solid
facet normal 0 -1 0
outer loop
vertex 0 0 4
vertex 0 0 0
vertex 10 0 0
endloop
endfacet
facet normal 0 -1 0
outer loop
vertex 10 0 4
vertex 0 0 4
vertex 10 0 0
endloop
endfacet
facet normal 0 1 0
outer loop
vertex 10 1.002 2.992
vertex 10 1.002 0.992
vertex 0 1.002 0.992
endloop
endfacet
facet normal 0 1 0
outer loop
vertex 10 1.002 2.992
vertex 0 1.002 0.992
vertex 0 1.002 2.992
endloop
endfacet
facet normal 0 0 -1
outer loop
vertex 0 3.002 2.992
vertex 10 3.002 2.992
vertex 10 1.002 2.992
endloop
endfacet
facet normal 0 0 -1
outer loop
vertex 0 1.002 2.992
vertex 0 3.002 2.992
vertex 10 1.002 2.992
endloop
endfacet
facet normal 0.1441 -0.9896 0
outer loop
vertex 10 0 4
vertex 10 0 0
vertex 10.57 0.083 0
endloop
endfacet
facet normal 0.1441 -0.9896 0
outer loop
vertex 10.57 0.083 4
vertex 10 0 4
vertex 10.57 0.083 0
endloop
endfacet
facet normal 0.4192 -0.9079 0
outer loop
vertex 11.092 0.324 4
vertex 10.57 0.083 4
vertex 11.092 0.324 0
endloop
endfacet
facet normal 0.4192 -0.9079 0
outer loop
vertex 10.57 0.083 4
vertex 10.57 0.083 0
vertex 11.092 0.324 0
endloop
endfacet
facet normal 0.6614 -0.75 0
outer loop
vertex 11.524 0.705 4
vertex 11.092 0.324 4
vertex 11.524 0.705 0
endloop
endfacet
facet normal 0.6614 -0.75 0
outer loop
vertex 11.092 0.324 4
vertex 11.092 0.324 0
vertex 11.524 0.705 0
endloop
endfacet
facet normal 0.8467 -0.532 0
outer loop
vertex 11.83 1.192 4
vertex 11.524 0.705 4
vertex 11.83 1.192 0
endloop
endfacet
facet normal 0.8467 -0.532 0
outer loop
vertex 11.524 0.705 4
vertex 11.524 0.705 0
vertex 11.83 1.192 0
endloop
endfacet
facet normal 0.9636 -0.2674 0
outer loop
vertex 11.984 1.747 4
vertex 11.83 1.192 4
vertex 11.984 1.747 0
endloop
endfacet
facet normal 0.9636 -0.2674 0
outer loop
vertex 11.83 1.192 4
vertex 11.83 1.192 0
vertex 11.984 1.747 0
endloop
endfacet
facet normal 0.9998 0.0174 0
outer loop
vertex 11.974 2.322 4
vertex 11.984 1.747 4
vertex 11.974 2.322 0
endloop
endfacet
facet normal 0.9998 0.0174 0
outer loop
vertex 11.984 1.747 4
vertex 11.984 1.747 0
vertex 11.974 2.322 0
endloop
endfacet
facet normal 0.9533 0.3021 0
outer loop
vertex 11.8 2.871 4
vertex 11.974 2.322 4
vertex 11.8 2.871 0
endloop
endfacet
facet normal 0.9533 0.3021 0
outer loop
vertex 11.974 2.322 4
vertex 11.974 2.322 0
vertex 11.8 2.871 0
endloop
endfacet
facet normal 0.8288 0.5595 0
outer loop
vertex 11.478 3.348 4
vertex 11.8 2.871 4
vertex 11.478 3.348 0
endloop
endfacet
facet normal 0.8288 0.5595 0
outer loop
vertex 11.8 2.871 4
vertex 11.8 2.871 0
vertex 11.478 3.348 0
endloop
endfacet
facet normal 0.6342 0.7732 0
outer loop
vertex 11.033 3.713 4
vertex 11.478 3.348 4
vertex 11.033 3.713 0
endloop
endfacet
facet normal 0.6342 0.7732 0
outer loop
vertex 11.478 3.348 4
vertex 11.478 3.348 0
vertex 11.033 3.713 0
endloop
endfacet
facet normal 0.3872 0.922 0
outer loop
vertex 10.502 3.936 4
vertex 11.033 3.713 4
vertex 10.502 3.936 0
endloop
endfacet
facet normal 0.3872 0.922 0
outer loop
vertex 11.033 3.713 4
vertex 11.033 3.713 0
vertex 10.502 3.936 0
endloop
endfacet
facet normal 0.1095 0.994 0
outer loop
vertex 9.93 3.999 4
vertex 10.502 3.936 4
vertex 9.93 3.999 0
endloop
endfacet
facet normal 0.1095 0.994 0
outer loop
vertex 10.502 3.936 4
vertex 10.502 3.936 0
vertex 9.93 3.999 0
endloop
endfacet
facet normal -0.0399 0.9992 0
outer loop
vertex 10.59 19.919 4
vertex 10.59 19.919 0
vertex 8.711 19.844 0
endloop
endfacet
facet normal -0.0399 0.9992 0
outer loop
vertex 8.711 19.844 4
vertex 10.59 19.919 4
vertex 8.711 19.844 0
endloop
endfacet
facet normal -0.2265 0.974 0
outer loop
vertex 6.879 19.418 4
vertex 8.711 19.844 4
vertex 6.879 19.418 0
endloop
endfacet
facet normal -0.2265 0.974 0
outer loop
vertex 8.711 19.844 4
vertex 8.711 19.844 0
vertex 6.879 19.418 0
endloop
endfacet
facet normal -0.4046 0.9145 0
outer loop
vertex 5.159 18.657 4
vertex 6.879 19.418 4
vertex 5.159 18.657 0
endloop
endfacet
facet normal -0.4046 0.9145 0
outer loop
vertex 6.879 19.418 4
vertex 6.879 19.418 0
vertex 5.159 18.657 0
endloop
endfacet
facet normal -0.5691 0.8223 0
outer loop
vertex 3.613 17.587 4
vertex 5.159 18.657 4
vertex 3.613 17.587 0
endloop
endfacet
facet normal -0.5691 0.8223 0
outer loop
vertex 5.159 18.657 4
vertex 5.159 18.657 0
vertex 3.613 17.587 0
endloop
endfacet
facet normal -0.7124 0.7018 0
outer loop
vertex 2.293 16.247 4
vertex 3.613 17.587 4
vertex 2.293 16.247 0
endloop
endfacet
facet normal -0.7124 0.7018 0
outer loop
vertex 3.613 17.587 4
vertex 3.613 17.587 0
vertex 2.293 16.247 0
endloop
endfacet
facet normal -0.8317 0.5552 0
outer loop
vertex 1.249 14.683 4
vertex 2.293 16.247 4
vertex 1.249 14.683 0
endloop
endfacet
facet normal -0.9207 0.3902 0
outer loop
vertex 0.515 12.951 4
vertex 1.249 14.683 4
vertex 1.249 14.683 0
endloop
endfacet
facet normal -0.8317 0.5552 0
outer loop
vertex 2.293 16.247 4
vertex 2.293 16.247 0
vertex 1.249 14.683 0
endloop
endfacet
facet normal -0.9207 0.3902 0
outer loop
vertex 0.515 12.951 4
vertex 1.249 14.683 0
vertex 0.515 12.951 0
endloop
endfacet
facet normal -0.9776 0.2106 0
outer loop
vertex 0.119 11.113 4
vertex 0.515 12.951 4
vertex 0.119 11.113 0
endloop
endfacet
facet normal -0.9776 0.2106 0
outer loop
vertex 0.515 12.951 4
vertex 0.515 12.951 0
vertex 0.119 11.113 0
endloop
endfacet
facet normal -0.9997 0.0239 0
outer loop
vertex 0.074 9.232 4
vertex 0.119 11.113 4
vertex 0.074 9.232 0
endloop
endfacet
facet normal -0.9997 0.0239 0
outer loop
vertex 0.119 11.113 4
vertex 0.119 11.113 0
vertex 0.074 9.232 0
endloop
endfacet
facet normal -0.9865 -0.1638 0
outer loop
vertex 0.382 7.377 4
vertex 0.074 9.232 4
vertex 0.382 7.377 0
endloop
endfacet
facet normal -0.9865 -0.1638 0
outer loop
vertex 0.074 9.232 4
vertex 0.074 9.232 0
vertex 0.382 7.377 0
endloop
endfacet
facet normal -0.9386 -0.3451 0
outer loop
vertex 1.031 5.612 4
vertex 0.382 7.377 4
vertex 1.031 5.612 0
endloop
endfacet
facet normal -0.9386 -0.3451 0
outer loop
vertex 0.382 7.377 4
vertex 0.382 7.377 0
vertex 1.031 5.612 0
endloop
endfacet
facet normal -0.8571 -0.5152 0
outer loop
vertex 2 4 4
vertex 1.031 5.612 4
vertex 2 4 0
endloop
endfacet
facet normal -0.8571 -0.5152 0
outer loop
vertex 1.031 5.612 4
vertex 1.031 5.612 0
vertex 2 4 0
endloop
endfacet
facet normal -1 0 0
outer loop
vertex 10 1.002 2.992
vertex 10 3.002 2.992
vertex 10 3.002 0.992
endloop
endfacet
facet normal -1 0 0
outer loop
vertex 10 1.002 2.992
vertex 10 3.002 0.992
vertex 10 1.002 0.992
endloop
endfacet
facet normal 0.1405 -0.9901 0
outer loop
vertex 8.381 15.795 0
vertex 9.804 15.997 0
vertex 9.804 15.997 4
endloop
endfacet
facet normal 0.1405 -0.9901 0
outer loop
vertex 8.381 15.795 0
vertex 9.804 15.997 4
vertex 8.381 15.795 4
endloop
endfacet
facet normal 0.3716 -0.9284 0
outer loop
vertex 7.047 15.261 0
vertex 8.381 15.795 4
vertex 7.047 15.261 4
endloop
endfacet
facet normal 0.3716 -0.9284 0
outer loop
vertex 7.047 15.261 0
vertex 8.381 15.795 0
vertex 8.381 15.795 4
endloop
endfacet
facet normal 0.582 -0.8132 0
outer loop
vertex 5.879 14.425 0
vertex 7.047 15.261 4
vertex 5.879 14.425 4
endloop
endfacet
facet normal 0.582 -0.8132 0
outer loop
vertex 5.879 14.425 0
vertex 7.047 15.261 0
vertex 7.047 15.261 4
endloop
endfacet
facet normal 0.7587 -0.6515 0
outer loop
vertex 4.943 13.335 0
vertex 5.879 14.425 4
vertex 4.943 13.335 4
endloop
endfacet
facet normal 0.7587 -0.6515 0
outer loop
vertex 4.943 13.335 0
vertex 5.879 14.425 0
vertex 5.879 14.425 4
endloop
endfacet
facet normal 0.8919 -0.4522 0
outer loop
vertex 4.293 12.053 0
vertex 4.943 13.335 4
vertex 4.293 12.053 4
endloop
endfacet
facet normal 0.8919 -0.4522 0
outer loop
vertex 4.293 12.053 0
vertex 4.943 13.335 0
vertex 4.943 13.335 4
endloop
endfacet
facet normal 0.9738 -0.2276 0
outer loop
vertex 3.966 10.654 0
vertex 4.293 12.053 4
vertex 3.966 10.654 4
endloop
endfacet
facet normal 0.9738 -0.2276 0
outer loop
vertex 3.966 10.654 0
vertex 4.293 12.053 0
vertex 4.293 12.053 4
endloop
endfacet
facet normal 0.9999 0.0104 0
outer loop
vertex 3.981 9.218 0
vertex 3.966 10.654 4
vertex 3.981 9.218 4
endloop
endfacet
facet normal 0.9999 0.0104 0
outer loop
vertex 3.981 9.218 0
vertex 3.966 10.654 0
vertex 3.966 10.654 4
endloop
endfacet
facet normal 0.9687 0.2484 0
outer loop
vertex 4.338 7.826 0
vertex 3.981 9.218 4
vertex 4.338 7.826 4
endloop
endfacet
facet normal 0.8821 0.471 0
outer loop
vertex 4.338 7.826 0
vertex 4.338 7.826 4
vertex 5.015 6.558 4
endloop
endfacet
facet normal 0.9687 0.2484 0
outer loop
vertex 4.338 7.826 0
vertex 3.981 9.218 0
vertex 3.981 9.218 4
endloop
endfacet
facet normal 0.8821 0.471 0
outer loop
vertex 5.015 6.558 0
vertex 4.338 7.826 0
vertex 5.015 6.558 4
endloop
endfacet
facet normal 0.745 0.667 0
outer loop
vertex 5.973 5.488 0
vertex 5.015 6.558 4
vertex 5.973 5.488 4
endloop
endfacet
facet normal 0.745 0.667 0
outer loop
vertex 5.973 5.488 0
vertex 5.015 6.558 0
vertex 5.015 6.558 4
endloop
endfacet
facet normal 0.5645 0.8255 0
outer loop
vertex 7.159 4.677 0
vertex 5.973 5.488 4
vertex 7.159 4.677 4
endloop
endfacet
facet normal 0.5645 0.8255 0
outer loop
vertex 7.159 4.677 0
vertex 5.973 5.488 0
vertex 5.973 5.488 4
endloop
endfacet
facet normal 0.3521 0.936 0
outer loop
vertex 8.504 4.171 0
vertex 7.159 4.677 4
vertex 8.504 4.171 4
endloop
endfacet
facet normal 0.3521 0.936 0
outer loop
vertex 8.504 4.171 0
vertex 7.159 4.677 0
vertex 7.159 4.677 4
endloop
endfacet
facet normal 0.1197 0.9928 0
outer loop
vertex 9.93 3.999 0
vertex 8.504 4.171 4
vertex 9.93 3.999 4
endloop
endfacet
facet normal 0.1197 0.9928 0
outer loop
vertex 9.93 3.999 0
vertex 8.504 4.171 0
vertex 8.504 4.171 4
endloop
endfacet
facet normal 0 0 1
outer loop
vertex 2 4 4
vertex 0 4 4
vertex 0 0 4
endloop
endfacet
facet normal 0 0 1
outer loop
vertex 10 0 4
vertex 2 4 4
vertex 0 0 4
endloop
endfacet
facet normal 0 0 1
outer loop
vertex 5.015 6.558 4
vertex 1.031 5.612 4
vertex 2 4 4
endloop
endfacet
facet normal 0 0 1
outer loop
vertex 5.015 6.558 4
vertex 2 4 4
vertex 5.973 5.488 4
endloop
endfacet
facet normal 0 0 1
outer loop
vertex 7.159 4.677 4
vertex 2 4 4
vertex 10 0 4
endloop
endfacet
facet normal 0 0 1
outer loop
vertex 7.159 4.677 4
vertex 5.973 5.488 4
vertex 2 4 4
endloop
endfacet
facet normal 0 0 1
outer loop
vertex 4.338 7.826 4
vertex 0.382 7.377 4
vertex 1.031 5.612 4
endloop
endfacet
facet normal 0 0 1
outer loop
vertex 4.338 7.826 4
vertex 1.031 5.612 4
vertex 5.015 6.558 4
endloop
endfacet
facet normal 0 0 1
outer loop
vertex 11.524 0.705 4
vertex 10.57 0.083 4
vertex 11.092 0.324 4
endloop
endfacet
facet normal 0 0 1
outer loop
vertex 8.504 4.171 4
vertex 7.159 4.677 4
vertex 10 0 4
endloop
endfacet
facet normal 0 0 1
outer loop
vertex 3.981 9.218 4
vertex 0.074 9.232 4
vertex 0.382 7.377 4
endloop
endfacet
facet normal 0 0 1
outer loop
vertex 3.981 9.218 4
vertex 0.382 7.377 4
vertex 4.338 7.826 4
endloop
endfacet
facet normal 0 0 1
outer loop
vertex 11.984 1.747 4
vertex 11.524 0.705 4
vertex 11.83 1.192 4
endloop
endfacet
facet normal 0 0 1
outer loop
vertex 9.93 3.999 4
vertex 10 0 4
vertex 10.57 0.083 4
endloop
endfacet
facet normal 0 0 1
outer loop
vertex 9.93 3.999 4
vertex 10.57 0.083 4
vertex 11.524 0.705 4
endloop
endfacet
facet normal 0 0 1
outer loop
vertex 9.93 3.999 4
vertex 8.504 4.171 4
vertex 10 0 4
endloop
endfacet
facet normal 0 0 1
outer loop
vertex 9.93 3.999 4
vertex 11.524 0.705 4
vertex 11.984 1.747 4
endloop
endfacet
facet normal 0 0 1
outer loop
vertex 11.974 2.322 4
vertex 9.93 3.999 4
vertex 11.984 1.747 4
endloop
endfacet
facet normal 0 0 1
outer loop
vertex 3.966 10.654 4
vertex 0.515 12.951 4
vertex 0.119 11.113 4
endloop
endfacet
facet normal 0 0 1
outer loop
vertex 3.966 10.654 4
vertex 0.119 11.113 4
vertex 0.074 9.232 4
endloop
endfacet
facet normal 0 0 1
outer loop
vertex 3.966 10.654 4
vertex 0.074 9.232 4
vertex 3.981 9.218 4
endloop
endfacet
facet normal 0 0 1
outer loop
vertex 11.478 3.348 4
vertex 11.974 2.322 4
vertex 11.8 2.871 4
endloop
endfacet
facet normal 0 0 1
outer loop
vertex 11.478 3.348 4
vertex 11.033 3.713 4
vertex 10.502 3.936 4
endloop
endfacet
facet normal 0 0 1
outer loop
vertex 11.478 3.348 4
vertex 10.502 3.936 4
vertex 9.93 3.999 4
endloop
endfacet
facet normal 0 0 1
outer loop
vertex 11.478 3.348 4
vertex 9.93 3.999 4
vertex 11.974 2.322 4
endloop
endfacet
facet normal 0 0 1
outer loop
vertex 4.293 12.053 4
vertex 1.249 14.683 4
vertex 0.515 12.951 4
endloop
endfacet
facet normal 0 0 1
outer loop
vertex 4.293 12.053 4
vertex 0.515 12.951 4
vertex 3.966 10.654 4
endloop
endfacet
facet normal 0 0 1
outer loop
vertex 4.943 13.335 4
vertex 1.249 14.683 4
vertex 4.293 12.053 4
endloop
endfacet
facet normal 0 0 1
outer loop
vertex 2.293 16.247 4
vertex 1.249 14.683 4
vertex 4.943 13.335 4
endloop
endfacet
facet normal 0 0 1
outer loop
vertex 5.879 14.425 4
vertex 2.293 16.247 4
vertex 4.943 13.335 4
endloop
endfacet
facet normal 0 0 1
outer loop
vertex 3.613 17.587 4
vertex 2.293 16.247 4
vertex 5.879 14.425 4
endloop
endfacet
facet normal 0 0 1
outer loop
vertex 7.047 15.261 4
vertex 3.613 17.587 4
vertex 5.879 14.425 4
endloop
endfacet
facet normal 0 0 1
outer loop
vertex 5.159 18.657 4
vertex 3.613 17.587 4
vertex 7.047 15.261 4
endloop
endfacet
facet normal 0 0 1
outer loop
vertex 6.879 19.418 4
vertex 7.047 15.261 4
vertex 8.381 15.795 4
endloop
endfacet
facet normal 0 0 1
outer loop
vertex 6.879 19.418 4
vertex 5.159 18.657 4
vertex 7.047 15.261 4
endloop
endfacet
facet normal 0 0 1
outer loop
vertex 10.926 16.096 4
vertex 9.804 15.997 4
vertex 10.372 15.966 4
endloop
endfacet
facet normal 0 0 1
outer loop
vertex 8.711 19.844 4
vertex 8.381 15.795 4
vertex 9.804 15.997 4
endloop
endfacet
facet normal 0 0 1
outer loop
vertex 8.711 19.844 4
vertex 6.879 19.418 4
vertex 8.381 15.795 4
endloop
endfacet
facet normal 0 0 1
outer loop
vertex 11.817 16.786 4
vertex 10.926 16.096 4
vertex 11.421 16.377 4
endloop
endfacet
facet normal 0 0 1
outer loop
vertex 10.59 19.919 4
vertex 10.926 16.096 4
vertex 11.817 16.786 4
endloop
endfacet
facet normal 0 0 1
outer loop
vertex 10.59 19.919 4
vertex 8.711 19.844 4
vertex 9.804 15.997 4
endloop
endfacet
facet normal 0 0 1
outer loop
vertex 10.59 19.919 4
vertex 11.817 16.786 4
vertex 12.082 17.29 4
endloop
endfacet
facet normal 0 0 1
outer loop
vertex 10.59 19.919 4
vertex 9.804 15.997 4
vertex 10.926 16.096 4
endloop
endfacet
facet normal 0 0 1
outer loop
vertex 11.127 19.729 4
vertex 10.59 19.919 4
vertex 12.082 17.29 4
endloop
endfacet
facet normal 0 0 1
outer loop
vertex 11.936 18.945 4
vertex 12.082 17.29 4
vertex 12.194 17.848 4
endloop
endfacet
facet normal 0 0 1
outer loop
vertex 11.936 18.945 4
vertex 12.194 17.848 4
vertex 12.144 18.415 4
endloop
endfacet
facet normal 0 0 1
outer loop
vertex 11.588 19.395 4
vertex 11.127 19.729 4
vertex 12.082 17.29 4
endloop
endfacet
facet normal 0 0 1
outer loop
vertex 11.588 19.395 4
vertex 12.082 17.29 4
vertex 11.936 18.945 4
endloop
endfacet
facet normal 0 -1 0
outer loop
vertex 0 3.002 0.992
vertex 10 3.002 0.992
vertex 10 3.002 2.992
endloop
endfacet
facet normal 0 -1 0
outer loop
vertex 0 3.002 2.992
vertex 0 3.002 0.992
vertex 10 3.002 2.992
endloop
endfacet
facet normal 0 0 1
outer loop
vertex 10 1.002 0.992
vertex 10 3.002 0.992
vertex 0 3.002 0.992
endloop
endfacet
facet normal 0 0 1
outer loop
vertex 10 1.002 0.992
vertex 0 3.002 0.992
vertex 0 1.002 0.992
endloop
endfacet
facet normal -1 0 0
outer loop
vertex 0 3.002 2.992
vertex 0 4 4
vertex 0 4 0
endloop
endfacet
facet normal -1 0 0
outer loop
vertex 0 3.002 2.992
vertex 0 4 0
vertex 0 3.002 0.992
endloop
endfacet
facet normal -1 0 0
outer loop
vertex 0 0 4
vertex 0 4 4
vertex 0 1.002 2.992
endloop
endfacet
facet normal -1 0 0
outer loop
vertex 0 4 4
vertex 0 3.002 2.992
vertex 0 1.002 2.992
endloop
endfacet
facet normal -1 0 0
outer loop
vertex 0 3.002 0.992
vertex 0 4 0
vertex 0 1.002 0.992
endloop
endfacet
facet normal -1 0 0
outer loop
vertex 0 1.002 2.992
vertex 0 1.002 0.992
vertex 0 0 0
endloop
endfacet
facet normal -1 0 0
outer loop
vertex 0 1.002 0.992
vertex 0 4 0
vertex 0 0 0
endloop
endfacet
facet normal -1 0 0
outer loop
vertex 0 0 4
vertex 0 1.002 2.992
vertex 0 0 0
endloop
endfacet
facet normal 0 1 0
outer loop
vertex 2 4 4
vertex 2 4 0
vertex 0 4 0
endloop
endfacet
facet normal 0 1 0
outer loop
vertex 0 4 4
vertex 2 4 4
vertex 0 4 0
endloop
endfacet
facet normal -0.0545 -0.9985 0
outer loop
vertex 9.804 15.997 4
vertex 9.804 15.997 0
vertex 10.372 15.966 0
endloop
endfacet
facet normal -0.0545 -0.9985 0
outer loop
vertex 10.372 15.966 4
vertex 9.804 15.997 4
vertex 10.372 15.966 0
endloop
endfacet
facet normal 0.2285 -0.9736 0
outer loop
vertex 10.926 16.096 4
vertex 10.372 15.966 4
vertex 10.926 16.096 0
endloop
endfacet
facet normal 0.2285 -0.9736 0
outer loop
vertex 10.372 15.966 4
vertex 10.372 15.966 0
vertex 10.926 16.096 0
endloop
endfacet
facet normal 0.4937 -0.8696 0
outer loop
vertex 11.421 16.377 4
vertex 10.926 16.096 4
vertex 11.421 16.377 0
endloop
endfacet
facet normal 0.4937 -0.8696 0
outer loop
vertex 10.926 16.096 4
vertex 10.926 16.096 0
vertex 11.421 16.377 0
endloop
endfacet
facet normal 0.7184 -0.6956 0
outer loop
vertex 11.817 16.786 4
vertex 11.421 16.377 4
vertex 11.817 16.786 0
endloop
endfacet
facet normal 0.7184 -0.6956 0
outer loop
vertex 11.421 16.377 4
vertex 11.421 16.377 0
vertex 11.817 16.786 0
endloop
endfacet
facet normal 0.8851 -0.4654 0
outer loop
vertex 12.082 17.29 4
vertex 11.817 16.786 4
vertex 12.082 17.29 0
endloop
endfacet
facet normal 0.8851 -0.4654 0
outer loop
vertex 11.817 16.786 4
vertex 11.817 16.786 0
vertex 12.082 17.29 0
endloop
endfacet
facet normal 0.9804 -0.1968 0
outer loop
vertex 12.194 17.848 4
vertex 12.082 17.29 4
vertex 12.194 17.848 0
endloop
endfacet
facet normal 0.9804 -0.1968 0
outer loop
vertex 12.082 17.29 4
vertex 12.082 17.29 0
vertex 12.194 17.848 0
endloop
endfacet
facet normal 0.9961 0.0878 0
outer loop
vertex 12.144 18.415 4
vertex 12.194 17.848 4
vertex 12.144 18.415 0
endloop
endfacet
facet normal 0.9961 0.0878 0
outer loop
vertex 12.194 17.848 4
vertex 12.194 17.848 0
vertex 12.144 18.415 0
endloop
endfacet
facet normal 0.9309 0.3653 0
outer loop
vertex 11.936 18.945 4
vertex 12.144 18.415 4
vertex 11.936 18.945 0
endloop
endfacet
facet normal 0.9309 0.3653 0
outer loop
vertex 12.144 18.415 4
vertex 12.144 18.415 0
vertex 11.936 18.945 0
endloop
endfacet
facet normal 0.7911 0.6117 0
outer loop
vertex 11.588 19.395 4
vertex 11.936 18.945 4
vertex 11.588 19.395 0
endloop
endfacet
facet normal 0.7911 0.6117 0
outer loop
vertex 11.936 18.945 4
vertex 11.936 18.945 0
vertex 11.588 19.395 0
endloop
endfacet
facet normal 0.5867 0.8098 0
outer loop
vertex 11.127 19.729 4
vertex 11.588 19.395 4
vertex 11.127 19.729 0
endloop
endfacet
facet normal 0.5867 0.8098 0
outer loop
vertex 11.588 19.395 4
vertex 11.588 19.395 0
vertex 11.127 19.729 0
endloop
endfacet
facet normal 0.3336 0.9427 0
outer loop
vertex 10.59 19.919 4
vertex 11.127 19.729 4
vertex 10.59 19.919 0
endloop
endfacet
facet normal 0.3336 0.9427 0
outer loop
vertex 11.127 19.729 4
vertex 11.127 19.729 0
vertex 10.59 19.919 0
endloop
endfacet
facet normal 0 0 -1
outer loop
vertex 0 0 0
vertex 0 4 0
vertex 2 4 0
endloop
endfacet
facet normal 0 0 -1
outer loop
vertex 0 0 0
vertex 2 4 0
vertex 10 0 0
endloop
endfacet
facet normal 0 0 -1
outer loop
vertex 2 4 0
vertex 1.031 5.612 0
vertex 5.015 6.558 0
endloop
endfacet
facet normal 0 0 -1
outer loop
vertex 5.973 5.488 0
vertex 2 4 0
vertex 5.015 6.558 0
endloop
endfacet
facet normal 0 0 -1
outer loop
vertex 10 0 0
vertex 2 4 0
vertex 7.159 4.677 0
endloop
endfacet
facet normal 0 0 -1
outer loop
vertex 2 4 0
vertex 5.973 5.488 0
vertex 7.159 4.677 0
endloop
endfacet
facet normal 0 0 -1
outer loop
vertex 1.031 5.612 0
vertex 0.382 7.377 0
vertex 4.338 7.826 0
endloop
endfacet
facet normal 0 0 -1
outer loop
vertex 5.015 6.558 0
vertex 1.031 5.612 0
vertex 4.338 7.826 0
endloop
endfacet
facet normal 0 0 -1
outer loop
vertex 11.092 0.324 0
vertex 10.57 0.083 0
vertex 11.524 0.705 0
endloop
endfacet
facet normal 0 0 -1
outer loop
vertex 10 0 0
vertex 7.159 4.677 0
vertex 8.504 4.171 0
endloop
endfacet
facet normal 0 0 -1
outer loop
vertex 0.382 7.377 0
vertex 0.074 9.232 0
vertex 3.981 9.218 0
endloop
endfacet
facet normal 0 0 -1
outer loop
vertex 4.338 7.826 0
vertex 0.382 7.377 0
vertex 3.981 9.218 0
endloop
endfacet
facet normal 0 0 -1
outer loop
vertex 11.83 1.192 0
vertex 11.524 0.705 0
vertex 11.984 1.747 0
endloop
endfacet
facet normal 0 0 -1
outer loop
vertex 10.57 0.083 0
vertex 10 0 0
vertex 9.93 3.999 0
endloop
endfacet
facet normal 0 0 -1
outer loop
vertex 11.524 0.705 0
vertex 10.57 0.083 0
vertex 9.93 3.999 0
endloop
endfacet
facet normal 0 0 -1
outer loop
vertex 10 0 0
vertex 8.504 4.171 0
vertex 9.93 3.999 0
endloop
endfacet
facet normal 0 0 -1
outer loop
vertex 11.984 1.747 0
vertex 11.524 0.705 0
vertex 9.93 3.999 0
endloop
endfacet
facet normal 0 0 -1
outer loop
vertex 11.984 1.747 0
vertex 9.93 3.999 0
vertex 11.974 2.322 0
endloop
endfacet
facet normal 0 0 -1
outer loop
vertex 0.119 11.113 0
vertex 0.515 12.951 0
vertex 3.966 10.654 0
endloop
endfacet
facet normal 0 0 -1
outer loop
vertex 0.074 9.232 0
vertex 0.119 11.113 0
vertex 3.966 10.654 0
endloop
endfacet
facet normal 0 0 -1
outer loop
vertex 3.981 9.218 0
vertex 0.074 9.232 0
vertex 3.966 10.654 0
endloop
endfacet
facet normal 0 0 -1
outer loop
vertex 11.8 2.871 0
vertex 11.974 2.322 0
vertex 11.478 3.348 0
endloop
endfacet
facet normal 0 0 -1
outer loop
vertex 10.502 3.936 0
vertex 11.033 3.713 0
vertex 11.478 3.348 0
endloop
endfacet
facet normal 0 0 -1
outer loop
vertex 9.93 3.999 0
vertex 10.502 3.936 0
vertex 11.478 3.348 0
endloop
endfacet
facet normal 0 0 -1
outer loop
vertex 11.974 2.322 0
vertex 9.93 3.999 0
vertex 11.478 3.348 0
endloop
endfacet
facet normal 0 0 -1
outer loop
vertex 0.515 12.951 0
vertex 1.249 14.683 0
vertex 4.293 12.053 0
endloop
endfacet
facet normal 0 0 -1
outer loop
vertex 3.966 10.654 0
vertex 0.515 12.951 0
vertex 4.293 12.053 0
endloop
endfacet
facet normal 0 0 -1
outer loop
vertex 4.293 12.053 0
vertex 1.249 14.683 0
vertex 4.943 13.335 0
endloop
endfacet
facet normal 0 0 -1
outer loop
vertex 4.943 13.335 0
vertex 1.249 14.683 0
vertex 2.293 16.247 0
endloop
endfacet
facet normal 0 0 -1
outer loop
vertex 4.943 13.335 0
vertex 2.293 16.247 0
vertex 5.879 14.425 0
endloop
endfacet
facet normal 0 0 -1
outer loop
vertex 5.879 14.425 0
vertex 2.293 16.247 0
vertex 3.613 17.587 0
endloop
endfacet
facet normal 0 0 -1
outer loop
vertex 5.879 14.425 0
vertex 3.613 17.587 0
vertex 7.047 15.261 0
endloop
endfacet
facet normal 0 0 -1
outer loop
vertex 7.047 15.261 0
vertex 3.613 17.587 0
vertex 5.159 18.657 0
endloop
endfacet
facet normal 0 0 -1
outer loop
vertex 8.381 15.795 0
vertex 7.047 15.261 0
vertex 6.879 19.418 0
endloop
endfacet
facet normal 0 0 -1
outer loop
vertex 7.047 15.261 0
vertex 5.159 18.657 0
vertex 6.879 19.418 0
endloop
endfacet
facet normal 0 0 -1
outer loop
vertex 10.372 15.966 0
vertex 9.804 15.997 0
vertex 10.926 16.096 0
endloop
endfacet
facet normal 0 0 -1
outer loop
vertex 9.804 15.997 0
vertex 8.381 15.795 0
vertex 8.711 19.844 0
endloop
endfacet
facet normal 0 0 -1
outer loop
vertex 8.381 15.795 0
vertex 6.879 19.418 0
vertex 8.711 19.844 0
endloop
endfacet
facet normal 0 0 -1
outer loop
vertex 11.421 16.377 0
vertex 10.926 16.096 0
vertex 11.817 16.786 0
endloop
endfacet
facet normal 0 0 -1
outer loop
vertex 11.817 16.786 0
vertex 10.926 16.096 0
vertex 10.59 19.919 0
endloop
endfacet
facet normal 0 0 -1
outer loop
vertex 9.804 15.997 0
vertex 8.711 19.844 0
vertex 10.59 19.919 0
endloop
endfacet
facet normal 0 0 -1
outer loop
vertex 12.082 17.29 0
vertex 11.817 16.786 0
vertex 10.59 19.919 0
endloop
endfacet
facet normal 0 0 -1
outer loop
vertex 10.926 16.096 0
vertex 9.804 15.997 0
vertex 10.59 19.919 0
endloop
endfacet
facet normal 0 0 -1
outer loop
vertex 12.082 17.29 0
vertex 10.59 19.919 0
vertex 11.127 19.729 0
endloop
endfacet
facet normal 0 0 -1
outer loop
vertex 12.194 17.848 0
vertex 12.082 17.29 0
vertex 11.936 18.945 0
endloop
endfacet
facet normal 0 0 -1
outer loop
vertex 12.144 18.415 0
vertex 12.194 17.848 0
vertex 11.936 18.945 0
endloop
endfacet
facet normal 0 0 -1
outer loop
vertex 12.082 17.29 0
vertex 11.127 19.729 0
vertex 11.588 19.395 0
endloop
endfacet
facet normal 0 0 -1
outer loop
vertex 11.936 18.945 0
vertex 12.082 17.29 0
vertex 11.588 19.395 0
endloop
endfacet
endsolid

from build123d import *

# Parameters (mm, degrees)
PAD_DEPTH    = 4
SKETCH001_W  = 2
SKETCH001_H  = 2
POCKET_DEPTH = 10


with BuildPart() as part:
    # Sketch → Pad (new body)
    with BuildSketch(Plane.XY):
        with BuildLine():
            Line((2, 4), (0, 4))
            Line((0, 4), (0, 0))
            Line((0, 0), (10, 0))
            ThreePointArc((10, 0), (11.999695, 2.034905), (9.930201, 3.998782))
            ThreePointArc((9.8035, 15.997444), (3.930535, 9.935427), (9.930201, 3.998782))
            ThreePointArc((9.8035, 15.997444), (12.157765, 17.565064), (10.590145, 19.91933))
            ThreePointArc((10.590145, 19.91933), (1.248586, 14.682773), (2, 4))
        make_face()
    extrude(amount=PAD_DEPTH)

    # Sketch001 (on DatumPlane) → Pocket (cut)
    with BuildSketch(Plane(origin=(0, 0, 0), x_dir=(0, -1, 0), z_dir=(-1, 0, 0))):
        with Locations((-2.001803, 1.992215)):
            Rectangle(SKETCH001_W, SKETCH001_H)
    extrude(amount=-POCKET_DEPTH, mode=Mode.SUBTRACT)


solid = part.part
